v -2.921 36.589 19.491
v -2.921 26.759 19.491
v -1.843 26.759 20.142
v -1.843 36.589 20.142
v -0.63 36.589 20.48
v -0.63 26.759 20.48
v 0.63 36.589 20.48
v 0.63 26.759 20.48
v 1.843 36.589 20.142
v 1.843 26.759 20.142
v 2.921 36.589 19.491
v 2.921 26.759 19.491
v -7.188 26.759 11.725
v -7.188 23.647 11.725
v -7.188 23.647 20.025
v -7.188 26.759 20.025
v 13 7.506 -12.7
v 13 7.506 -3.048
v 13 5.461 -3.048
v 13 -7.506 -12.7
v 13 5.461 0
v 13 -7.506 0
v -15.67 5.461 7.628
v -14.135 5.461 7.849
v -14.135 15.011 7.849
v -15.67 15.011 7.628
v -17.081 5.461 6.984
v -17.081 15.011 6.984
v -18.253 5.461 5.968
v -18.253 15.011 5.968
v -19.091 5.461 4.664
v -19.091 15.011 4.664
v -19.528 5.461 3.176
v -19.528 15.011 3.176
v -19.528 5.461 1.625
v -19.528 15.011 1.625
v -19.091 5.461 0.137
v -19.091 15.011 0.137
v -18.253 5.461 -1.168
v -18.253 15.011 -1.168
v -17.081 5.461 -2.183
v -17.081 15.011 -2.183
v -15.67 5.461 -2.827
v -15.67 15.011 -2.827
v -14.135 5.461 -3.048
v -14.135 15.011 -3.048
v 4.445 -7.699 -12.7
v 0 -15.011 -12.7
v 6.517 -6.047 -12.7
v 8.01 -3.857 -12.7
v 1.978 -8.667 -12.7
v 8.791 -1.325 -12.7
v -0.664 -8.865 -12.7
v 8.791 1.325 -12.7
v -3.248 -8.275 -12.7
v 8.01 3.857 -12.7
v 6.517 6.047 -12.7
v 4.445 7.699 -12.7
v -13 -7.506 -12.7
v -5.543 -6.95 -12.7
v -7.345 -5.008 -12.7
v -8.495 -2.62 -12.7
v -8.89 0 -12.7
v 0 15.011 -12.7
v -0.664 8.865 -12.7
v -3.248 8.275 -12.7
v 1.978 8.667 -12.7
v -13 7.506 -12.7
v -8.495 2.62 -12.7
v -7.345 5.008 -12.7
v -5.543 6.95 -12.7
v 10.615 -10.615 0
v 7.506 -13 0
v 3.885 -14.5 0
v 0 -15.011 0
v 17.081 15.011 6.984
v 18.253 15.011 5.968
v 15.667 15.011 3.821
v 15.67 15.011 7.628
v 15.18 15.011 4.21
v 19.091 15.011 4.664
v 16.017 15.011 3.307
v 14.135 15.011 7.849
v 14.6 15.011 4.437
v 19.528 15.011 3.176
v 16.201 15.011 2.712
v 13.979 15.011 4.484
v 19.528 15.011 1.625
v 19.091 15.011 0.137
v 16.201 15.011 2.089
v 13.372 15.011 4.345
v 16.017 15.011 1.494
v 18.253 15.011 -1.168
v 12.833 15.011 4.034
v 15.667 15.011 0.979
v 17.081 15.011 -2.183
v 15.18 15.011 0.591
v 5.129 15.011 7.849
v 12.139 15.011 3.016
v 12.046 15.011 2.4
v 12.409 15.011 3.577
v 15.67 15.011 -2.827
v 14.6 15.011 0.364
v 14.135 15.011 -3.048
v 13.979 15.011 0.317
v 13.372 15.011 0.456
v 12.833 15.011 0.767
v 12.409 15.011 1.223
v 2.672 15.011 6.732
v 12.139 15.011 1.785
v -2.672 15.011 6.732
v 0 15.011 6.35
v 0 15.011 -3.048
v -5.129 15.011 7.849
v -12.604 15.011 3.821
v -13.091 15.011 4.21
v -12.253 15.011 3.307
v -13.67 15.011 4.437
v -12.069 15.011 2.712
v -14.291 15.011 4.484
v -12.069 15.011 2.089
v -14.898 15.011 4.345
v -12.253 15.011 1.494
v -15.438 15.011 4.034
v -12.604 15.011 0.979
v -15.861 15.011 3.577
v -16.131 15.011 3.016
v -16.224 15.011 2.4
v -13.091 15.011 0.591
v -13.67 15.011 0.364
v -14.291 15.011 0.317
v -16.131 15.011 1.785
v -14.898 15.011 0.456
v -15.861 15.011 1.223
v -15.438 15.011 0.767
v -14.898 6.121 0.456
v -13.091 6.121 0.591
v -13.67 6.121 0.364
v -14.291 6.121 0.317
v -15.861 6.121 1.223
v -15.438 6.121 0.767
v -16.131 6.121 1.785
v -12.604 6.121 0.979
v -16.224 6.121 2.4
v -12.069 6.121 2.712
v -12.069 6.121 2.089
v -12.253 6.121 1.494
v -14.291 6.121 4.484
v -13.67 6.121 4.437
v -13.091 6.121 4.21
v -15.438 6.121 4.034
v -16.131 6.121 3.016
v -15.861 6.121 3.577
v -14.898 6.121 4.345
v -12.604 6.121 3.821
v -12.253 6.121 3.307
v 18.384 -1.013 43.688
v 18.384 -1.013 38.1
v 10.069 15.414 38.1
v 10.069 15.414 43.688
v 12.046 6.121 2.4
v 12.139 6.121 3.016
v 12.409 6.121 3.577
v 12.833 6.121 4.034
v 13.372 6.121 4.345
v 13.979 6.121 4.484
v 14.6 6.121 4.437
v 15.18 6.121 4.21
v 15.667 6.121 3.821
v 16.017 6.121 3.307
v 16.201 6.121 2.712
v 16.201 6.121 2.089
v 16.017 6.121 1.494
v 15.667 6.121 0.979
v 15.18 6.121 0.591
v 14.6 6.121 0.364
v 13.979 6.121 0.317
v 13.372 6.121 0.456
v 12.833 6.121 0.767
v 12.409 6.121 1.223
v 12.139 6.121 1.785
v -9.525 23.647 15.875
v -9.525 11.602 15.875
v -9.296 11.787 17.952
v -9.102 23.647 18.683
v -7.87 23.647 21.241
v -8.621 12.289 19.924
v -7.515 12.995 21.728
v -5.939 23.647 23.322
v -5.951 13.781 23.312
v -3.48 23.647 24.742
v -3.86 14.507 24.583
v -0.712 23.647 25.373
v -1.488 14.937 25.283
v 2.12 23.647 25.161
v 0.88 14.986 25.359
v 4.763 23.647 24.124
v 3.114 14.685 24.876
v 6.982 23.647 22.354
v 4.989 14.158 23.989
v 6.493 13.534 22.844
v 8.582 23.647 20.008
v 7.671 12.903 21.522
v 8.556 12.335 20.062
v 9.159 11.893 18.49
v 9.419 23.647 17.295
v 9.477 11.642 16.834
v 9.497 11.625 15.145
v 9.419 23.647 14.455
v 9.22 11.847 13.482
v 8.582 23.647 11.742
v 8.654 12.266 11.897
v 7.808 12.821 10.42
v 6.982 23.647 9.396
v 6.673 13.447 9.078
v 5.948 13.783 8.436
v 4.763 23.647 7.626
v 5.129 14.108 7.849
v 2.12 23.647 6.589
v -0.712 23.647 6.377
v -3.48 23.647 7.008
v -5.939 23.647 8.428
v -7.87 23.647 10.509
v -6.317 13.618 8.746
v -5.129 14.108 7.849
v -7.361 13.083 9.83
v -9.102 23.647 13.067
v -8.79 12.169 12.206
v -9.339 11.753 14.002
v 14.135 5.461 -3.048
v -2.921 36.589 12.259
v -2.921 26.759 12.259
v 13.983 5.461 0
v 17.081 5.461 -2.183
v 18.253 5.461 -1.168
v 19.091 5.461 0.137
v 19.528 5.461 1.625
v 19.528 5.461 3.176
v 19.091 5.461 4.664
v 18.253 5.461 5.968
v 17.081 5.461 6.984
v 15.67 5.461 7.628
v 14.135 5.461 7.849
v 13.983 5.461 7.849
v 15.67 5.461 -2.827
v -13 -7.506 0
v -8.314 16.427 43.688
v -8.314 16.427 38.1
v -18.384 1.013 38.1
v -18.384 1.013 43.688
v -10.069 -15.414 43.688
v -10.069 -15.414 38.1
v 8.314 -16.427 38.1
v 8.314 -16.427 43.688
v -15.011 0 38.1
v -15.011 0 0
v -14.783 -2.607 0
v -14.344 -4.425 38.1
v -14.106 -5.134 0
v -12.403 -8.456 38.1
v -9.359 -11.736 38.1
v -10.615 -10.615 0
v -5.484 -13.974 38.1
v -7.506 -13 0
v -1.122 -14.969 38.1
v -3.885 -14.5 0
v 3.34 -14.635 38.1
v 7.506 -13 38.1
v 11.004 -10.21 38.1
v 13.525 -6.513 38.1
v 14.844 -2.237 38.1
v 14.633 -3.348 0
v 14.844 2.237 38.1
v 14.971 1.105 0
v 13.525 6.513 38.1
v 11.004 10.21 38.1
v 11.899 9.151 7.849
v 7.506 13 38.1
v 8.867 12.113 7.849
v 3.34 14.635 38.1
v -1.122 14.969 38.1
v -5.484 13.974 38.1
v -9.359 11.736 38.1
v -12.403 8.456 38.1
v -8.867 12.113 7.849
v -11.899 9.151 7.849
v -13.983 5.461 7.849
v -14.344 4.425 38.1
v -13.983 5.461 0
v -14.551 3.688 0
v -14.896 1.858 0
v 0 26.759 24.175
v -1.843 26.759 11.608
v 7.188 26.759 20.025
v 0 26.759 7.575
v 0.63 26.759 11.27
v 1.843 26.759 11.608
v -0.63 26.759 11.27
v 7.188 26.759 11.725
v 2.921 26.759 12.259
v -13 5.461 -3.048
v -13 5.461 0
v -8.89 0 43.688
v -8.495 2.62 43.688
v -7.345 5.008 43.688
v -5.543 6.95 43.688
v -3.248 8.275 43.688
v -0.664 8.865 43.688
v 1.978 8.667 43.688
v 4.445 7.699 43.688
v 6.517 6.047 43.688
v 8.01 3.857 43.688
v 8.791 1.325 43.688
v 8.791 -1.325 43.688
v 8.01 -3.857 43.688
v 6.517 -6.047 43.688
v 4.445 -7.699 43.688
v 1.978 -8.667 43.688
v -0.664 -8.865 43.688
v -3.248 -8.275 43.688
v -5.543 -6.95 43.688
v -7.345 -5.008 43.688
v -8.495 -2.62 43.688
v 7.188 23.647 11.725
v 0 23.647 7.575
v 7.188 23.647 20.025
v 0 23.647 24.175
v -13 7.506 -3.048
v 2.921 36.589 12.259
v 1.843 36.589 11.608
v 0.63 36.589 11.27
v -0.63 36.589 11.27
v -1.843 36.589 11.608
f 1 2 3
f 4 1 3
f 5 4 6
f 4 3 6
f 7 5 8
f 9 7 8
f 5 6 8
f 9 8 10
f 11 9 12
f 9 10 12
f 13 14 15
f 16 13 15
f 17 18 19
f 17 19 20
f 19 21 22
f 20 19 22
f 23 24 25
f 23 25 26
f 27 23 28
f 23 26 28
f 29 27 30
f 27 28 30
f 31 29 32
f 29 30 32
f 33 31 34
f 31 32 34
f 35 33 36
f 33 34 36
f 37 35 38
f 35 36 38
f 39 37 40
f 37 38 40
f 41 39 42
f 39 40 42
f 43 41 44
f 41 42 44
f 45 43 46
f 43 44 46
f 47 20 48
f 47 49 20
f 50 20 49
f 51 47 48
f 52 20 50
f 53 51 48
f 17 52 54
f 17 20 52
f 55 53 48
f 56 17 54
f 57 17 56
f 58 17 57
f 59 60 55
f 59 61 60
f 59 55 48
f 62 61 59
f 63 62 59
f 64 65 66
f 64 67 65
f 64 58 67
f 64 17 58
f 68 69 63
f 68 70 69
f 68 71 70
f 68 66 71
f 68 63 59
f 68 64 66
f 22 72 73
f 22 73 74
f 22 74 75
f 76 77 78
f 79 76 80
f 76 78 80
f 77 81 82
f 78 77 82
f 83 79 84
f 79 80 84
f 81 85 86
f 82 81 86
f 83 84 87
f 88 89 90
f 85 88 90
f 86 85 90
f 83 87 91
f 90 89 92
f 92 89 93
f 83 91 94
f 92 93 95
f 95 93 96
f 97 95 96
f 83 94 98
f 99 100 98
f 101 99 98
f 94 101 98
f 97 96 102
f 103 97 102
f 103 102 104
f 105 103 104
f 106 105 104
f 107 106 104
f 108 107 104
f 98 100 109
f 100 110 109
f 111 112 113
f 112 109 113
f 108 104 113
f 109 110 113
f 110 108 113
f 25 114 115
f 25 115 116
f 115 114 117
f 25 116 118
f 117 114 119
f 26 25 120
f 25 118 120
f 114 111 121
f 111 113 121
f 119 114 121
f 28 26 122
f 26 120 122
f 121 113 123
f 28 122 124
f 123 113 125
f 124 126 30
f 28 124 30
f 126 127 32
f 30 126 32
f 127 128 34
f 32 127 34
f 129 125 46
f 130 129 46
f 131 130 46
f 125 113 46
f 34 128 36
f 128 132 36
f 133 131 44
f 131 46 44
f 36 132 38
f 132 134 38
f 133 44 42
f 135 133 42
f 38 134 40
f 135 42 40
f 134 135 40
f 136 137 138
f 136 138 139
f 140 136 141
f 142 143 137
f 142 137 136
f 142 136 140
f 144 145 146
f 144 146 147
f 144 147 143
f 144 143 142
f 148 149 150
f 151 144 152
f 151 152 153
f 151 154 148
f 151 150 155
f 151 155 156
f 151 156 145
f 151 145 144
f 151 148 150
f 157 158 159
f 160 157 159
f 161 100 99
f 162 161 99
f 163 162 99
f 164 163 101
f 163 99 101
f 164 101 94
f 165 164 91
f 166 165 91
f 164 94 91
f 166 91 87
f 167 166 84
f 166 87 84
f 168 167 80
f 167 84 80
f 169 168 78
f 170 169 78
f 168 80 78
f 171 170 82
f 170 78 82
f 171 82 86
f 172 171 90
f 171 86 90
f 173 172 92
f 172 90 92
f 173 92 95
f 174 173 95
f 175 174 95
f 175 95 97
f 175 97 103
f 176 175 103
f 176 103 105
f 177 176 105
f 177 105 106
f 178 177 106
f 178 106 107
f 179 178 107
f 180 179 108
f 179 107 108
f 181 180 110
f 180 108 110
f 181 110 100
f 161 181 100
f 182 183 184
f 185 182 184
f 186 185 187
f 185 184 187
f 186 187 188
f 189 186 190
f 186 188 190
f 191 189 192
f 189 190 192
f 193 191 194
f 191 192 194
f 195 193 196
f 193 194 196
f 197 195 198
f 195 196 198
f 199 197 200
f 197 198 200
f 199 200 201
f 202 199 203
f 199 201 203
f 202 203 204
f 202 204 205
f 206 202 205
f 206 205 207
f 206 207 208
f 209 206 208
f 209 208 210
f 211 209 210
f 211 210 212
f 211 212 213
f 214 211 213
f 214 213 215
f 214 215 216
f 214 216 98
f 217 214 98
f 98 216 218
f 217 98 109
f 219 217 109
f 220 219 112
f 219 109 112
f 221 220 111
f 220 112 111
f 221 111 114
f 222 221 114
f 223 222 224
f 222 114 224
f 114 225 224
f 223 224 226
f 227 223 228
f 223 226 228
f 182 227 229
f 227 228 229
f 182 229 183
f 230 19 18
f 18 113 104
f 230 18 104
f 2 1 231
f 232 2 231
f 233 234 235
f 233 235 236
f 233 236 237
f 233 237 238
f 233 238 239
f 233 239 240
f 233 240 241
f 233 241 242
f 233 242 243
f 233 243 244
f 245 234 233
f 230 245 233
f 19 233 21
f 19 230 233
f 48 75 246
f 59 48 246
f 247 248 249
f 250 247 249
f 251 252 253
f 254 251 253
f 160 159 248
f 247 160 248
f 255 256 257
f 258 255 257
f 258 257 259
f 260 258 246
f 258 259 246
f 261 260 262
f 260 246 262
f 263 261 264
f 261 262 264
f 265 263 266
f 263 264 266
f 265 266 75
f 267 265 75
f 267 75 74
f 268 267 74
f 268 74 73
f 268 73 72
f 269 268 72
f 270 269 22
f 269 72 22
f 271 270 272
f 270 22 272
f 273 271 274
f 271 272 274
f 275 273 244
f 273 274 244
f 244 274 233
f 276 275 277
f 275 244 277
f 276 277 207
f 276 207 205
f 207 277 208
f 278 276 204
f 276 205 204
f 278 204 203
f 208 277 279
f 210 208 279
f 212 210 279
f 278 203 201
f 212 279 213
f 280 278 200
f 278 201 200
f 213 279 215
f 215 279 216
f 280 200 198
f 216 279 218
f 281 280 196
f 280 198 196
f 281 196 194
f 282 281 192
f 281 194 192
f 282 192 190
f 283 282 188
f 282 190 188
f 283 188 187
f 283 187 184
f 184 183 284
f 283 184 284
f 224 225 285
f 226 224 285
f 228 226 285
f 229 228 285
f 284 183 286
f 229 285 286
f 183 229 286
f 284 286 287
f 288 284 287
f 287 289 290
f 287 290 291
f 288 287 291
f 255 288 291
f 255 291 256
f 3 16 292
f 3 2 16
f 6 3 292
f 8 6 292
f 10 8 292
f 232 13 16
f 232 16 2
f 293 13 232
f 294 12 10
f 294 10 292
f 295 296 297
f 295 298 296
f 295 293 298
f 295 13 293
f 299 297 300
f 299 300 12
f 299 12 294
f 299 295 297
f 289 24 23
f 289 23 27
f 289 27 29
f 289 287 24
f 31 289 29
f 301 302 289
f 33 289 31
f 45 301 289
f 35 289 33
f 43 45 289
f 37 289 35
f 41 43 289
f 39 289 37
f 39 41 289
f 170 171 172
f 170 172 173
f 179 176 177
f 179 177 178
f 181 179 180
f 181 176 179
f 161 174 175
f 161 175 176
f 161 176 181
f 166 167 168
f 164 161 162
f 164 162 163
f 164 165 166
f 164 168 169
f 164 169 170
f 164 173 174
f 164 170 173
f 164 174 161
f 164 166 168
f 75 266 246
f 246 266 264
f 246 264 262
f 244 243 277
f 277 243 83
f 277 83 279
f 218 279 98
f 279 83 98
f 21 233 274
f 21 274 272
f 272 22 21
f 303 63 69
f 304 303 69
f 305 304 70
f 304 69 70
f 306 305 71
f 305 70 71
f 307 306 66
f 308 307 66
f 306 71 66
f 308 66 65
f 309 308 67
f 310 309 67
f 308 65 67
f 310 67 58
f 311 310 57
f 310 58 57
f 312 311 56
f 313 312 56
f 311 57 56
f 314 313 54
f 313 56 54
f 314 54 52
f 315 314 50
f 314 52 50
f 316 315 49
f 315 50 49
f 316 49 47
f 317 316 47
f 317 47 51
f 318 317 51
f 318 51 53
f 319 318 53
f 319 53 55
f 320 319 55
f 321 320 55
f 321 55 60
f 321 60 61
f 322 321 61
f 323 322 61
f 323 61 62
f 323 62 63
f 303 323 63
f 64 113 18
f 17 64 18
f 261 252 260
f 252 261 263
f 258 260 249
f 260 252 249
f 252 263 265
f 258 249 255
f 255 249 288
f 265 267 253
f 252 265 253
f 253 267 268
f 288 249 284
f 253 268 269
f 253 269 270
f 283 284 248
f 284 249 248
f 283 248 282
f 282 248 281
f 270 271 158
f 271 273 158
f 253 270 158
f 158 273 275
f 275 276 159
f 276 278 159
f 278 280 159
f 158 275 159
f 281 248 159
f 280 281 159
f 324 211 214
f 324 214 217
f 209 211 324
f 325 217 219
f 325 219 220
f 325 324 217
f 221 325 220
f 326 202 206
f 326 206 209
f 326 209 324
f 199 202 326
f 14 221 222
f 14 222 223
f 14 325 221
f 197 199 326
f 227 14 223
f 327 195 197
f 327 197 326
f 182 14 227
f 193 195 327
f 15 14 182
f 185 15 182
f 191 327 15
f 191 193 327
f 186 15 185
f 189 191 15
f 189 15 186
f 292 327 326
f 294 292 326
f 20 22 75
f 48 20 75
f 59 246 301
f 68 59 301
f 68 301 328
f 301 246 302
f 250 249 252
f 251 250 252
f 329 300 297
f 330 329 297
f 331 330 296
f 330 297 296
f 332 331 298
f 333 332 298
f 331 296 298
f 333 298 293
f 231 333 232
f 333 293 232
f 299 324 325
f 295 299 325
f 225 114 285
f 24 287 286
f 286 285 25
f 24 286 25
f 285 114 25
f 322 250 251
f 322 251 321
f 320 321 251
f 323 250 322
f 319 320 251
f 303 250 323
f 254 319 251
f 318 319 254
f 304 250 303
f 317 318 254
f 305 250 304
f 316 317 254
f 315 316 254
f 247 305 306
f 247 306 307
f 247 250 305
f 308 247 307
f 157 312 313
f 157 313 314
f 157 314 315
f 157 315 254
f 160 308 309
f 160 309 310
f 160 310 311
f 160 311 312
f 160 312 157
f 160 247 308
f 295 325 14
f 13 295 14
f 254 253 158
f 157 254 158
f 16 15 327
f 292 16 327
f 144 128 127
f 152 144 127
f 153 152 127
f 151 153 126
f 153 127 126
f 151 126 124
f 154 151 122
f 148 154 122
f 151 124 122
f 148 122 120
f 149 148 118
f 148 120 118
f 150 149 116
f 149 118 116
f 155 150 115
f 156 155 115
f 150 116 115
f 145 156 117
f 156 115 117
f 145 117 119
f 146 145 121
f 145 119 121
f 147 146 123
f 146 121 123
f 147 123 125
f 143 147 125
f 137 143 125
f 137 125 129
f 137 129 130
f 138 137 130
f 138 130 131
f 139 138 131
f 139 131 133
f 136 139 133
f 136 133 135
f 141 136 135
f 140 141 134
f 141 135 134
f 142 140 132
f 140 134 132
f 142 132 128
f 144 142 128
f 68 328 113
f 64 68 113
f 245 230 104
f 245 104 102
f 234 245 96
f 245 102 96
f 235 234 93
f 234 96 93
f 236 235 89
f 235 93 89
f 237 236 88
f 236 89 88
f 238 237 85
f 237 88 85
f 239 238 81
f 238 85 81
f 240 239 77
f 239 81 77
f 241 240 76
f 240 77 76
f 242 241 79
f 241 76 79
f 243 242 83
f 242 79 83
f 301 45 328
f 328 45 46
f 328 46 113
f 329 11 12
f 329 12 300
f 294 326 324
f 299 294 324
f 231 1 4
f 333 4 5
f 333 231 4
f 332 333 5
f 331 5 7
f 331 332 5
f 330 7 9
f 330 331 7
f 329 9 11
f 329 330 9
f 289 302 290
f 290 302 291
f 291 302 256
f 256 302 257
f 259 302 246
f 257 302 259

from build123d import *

# Parameters (mm, degrees)
SKETCH1_R                = 15.0114
BOSS_EXTRUDE1_DEPTH      = 38.1
BOSS_EXTRUDE2_DEPTH      = 5.588
BOSS_EXTRUDE3_DEPTH      = 12.7
BOSS_EXTRUDE4_DEPTH      = 9.5504
SKETCH4_R                = 8.89
CUT_EXTRUDE1_DEPTH       = 62.91098247
BOSS_EXTRUDE5_DEPTH      = 8.636
BOSS_EXTRUDE5_DEPTH_BACK = 5.08
SKETCH6_R                = 9.525
BOSS_EXTRUDE6_DEPTH      = 3.1115
SKETCH8_W                = 5.842
SKETCH8_H                = 7.231465202
BOSS_EXTRUDE7_DEPTH      = 9.8298
SKETCH9_R                = 2.08915
CUT_EXTRUDE2_DEPTH       = 8.89


with BuildPart() as part:
    # Sketch1 → Boss-Extrude1 (new body)
    with BuildSketch(Plane.XY):
        with Locations(Location((0, 0, 0), (0, 0, 180))):
            Circle(SKETCH1_R)
    extrude(amount=BOSS_EXTRUDE1_DEPTH)

    # Sketch2 → Boss-Extrude2 (add)
    with BuildSketch(Plane.XY.offset(38.1)):
        Polygon((-8.314485622, 16.42722286), (-18.383635121, 1.013055662), (-10.069149499, -15.414167198), (8.314485622, -16.42722286), (18.383635121, -1.013055662), (10.069149499, 15.414167198), align=None)
    extrude(amount=BOSS_EXTRUDE2_DEPTH)

    # Sketch3 → Boss-Extrude3 (add)
    with BuildSketch(Plane(origin=(0, 0, 0), x_dir=(-1, 0, 0), z_dir=(0, 0, -1))):
        Polygon((0, 15.0114), (-13.000253746, 7.5057), (-13.000253746, -7.5057), (0, -15.0114), (13.000253746, -7.5057), (13.000253746, 7.5057), align=None)
    extrude(amount=BOSS_EXTRUDE3_DEPTH)

    # Sketch5 → Boss-Extrude4 (add)
    with BuildSketch(Plane(origin=(0, 15.0114, 0), x_dir=(1, 0, 0), z_dir=(0, 1, 0))):
        with BuildLine():
            Line((-14.1351, 3.048), (14.1351, 3.048))
            ThreePointArc((14.1351, 3.048), (19.5834, -2.4003), (14.1351, -7.8486))
            Line((14.1351, -7.8486), (-14.1351, -7.8486))
            ThreePointArc((-14.1351, -7.8486), (-19.5834, -2.4003), (-14.1351, 3.048))
        make_face()
    extrude(amount=-BOSS_EXTRUDE4_DEPTH)

    # Sketch4 → Cut-Extrude1 (cut, through all)
    with BuildSketch(Plane(origin=(0, 0, -12.7), x_dir=(-1, 0, 0), z_dir=(0, 0, -1))):
        Circle(SKETCH4_R)
    extrude(amount=-CUT_EXTRUDE1_DEPTH, mode=Mode.SUBTRACT)

    # Sketch6 → Boss-Extrude5 (add, two sides: drawn at the far end of the back side and taken through both)
    with BuildSketch(Plane(origin=(0, 15.0114, 0), x_dir=(1, 0, 0), z_dir=(0, 1, 0)).offset(-BOSS_EXTRUDE5_DEPTH_BACK)):
        with Locations(Location((0, -15.875, 0), (0, 0, 180))):
            Circle(SKETCH6_R)
    extrude(amount=BOSS_EXTRUDE5_DEPTH + BOSS_EXTRUDE5_DEPTH_BACK)

    # Sketch7 → Boss-Extrude6 (add)
    with BuildSketch(Plane(origin=(0, 23.6474, 0), x_dir=(1, 0, 0), z_dir=(0, 1, 0))):
        Polygon((0, -7.57478159), (-7.1882, -11.724890795), (-7.1882, -20.025109205), (0, -24.17521841), (7.1882, -20.025109205), (7.1882, -11.724890795), align=None)
    extrude(amount=BOSS_EXTRUDE6_DEPTH)

    # Sketch8 → Boss-Extrude7 (add)
    with BuildSketch(Plane(origin=(0, 26.7589, 0), x_dir=(1, 0, 0), z_dir=(0, 1, 0))):
        with Locations((0, -15.875)):
            Rectangle(SKETCH8_W, SKETCH8_H)
        with BuildLine():
            ThreePointArc((2.921, -12.259267399), (0, -11.2268), (-2.921, -12.259267399))
            Line((-2.921, -12.259267399), (2.921, -12.259267399))
        make_face()
        with BuildLine():
            Line((2.921, -19.490732601), (-2.921, -19.490732601))
            ThreePointArc((-2.921, -19.490732601), (0, -20.5232), (2.921, -19.490732601))
        make_face()
    extrude(amount=BOSS_EXTRUDE7_DEPTH)

    # Sketch9 → Cut-Extrude2 (cut)
    with BuildSketch(Plane(origin=(0, 15.0114, 0), x_dir=(1, 0, 0), z_dir=(0, 1, 0))):
        with Locations(Location((14.1351, -2.4003, 0), (0, 0, 180))):
            Circle(SKETCH9_R)
        with Locations(Location((-14.1351, -2.4003, 0), (0, 0, 180))):
            Circle(SKETCH9_R)
    extrude(amount=-CUT_EXTRUDE2_DEPTH, mode=Mode.SUBTRACT)


solid = part.part
